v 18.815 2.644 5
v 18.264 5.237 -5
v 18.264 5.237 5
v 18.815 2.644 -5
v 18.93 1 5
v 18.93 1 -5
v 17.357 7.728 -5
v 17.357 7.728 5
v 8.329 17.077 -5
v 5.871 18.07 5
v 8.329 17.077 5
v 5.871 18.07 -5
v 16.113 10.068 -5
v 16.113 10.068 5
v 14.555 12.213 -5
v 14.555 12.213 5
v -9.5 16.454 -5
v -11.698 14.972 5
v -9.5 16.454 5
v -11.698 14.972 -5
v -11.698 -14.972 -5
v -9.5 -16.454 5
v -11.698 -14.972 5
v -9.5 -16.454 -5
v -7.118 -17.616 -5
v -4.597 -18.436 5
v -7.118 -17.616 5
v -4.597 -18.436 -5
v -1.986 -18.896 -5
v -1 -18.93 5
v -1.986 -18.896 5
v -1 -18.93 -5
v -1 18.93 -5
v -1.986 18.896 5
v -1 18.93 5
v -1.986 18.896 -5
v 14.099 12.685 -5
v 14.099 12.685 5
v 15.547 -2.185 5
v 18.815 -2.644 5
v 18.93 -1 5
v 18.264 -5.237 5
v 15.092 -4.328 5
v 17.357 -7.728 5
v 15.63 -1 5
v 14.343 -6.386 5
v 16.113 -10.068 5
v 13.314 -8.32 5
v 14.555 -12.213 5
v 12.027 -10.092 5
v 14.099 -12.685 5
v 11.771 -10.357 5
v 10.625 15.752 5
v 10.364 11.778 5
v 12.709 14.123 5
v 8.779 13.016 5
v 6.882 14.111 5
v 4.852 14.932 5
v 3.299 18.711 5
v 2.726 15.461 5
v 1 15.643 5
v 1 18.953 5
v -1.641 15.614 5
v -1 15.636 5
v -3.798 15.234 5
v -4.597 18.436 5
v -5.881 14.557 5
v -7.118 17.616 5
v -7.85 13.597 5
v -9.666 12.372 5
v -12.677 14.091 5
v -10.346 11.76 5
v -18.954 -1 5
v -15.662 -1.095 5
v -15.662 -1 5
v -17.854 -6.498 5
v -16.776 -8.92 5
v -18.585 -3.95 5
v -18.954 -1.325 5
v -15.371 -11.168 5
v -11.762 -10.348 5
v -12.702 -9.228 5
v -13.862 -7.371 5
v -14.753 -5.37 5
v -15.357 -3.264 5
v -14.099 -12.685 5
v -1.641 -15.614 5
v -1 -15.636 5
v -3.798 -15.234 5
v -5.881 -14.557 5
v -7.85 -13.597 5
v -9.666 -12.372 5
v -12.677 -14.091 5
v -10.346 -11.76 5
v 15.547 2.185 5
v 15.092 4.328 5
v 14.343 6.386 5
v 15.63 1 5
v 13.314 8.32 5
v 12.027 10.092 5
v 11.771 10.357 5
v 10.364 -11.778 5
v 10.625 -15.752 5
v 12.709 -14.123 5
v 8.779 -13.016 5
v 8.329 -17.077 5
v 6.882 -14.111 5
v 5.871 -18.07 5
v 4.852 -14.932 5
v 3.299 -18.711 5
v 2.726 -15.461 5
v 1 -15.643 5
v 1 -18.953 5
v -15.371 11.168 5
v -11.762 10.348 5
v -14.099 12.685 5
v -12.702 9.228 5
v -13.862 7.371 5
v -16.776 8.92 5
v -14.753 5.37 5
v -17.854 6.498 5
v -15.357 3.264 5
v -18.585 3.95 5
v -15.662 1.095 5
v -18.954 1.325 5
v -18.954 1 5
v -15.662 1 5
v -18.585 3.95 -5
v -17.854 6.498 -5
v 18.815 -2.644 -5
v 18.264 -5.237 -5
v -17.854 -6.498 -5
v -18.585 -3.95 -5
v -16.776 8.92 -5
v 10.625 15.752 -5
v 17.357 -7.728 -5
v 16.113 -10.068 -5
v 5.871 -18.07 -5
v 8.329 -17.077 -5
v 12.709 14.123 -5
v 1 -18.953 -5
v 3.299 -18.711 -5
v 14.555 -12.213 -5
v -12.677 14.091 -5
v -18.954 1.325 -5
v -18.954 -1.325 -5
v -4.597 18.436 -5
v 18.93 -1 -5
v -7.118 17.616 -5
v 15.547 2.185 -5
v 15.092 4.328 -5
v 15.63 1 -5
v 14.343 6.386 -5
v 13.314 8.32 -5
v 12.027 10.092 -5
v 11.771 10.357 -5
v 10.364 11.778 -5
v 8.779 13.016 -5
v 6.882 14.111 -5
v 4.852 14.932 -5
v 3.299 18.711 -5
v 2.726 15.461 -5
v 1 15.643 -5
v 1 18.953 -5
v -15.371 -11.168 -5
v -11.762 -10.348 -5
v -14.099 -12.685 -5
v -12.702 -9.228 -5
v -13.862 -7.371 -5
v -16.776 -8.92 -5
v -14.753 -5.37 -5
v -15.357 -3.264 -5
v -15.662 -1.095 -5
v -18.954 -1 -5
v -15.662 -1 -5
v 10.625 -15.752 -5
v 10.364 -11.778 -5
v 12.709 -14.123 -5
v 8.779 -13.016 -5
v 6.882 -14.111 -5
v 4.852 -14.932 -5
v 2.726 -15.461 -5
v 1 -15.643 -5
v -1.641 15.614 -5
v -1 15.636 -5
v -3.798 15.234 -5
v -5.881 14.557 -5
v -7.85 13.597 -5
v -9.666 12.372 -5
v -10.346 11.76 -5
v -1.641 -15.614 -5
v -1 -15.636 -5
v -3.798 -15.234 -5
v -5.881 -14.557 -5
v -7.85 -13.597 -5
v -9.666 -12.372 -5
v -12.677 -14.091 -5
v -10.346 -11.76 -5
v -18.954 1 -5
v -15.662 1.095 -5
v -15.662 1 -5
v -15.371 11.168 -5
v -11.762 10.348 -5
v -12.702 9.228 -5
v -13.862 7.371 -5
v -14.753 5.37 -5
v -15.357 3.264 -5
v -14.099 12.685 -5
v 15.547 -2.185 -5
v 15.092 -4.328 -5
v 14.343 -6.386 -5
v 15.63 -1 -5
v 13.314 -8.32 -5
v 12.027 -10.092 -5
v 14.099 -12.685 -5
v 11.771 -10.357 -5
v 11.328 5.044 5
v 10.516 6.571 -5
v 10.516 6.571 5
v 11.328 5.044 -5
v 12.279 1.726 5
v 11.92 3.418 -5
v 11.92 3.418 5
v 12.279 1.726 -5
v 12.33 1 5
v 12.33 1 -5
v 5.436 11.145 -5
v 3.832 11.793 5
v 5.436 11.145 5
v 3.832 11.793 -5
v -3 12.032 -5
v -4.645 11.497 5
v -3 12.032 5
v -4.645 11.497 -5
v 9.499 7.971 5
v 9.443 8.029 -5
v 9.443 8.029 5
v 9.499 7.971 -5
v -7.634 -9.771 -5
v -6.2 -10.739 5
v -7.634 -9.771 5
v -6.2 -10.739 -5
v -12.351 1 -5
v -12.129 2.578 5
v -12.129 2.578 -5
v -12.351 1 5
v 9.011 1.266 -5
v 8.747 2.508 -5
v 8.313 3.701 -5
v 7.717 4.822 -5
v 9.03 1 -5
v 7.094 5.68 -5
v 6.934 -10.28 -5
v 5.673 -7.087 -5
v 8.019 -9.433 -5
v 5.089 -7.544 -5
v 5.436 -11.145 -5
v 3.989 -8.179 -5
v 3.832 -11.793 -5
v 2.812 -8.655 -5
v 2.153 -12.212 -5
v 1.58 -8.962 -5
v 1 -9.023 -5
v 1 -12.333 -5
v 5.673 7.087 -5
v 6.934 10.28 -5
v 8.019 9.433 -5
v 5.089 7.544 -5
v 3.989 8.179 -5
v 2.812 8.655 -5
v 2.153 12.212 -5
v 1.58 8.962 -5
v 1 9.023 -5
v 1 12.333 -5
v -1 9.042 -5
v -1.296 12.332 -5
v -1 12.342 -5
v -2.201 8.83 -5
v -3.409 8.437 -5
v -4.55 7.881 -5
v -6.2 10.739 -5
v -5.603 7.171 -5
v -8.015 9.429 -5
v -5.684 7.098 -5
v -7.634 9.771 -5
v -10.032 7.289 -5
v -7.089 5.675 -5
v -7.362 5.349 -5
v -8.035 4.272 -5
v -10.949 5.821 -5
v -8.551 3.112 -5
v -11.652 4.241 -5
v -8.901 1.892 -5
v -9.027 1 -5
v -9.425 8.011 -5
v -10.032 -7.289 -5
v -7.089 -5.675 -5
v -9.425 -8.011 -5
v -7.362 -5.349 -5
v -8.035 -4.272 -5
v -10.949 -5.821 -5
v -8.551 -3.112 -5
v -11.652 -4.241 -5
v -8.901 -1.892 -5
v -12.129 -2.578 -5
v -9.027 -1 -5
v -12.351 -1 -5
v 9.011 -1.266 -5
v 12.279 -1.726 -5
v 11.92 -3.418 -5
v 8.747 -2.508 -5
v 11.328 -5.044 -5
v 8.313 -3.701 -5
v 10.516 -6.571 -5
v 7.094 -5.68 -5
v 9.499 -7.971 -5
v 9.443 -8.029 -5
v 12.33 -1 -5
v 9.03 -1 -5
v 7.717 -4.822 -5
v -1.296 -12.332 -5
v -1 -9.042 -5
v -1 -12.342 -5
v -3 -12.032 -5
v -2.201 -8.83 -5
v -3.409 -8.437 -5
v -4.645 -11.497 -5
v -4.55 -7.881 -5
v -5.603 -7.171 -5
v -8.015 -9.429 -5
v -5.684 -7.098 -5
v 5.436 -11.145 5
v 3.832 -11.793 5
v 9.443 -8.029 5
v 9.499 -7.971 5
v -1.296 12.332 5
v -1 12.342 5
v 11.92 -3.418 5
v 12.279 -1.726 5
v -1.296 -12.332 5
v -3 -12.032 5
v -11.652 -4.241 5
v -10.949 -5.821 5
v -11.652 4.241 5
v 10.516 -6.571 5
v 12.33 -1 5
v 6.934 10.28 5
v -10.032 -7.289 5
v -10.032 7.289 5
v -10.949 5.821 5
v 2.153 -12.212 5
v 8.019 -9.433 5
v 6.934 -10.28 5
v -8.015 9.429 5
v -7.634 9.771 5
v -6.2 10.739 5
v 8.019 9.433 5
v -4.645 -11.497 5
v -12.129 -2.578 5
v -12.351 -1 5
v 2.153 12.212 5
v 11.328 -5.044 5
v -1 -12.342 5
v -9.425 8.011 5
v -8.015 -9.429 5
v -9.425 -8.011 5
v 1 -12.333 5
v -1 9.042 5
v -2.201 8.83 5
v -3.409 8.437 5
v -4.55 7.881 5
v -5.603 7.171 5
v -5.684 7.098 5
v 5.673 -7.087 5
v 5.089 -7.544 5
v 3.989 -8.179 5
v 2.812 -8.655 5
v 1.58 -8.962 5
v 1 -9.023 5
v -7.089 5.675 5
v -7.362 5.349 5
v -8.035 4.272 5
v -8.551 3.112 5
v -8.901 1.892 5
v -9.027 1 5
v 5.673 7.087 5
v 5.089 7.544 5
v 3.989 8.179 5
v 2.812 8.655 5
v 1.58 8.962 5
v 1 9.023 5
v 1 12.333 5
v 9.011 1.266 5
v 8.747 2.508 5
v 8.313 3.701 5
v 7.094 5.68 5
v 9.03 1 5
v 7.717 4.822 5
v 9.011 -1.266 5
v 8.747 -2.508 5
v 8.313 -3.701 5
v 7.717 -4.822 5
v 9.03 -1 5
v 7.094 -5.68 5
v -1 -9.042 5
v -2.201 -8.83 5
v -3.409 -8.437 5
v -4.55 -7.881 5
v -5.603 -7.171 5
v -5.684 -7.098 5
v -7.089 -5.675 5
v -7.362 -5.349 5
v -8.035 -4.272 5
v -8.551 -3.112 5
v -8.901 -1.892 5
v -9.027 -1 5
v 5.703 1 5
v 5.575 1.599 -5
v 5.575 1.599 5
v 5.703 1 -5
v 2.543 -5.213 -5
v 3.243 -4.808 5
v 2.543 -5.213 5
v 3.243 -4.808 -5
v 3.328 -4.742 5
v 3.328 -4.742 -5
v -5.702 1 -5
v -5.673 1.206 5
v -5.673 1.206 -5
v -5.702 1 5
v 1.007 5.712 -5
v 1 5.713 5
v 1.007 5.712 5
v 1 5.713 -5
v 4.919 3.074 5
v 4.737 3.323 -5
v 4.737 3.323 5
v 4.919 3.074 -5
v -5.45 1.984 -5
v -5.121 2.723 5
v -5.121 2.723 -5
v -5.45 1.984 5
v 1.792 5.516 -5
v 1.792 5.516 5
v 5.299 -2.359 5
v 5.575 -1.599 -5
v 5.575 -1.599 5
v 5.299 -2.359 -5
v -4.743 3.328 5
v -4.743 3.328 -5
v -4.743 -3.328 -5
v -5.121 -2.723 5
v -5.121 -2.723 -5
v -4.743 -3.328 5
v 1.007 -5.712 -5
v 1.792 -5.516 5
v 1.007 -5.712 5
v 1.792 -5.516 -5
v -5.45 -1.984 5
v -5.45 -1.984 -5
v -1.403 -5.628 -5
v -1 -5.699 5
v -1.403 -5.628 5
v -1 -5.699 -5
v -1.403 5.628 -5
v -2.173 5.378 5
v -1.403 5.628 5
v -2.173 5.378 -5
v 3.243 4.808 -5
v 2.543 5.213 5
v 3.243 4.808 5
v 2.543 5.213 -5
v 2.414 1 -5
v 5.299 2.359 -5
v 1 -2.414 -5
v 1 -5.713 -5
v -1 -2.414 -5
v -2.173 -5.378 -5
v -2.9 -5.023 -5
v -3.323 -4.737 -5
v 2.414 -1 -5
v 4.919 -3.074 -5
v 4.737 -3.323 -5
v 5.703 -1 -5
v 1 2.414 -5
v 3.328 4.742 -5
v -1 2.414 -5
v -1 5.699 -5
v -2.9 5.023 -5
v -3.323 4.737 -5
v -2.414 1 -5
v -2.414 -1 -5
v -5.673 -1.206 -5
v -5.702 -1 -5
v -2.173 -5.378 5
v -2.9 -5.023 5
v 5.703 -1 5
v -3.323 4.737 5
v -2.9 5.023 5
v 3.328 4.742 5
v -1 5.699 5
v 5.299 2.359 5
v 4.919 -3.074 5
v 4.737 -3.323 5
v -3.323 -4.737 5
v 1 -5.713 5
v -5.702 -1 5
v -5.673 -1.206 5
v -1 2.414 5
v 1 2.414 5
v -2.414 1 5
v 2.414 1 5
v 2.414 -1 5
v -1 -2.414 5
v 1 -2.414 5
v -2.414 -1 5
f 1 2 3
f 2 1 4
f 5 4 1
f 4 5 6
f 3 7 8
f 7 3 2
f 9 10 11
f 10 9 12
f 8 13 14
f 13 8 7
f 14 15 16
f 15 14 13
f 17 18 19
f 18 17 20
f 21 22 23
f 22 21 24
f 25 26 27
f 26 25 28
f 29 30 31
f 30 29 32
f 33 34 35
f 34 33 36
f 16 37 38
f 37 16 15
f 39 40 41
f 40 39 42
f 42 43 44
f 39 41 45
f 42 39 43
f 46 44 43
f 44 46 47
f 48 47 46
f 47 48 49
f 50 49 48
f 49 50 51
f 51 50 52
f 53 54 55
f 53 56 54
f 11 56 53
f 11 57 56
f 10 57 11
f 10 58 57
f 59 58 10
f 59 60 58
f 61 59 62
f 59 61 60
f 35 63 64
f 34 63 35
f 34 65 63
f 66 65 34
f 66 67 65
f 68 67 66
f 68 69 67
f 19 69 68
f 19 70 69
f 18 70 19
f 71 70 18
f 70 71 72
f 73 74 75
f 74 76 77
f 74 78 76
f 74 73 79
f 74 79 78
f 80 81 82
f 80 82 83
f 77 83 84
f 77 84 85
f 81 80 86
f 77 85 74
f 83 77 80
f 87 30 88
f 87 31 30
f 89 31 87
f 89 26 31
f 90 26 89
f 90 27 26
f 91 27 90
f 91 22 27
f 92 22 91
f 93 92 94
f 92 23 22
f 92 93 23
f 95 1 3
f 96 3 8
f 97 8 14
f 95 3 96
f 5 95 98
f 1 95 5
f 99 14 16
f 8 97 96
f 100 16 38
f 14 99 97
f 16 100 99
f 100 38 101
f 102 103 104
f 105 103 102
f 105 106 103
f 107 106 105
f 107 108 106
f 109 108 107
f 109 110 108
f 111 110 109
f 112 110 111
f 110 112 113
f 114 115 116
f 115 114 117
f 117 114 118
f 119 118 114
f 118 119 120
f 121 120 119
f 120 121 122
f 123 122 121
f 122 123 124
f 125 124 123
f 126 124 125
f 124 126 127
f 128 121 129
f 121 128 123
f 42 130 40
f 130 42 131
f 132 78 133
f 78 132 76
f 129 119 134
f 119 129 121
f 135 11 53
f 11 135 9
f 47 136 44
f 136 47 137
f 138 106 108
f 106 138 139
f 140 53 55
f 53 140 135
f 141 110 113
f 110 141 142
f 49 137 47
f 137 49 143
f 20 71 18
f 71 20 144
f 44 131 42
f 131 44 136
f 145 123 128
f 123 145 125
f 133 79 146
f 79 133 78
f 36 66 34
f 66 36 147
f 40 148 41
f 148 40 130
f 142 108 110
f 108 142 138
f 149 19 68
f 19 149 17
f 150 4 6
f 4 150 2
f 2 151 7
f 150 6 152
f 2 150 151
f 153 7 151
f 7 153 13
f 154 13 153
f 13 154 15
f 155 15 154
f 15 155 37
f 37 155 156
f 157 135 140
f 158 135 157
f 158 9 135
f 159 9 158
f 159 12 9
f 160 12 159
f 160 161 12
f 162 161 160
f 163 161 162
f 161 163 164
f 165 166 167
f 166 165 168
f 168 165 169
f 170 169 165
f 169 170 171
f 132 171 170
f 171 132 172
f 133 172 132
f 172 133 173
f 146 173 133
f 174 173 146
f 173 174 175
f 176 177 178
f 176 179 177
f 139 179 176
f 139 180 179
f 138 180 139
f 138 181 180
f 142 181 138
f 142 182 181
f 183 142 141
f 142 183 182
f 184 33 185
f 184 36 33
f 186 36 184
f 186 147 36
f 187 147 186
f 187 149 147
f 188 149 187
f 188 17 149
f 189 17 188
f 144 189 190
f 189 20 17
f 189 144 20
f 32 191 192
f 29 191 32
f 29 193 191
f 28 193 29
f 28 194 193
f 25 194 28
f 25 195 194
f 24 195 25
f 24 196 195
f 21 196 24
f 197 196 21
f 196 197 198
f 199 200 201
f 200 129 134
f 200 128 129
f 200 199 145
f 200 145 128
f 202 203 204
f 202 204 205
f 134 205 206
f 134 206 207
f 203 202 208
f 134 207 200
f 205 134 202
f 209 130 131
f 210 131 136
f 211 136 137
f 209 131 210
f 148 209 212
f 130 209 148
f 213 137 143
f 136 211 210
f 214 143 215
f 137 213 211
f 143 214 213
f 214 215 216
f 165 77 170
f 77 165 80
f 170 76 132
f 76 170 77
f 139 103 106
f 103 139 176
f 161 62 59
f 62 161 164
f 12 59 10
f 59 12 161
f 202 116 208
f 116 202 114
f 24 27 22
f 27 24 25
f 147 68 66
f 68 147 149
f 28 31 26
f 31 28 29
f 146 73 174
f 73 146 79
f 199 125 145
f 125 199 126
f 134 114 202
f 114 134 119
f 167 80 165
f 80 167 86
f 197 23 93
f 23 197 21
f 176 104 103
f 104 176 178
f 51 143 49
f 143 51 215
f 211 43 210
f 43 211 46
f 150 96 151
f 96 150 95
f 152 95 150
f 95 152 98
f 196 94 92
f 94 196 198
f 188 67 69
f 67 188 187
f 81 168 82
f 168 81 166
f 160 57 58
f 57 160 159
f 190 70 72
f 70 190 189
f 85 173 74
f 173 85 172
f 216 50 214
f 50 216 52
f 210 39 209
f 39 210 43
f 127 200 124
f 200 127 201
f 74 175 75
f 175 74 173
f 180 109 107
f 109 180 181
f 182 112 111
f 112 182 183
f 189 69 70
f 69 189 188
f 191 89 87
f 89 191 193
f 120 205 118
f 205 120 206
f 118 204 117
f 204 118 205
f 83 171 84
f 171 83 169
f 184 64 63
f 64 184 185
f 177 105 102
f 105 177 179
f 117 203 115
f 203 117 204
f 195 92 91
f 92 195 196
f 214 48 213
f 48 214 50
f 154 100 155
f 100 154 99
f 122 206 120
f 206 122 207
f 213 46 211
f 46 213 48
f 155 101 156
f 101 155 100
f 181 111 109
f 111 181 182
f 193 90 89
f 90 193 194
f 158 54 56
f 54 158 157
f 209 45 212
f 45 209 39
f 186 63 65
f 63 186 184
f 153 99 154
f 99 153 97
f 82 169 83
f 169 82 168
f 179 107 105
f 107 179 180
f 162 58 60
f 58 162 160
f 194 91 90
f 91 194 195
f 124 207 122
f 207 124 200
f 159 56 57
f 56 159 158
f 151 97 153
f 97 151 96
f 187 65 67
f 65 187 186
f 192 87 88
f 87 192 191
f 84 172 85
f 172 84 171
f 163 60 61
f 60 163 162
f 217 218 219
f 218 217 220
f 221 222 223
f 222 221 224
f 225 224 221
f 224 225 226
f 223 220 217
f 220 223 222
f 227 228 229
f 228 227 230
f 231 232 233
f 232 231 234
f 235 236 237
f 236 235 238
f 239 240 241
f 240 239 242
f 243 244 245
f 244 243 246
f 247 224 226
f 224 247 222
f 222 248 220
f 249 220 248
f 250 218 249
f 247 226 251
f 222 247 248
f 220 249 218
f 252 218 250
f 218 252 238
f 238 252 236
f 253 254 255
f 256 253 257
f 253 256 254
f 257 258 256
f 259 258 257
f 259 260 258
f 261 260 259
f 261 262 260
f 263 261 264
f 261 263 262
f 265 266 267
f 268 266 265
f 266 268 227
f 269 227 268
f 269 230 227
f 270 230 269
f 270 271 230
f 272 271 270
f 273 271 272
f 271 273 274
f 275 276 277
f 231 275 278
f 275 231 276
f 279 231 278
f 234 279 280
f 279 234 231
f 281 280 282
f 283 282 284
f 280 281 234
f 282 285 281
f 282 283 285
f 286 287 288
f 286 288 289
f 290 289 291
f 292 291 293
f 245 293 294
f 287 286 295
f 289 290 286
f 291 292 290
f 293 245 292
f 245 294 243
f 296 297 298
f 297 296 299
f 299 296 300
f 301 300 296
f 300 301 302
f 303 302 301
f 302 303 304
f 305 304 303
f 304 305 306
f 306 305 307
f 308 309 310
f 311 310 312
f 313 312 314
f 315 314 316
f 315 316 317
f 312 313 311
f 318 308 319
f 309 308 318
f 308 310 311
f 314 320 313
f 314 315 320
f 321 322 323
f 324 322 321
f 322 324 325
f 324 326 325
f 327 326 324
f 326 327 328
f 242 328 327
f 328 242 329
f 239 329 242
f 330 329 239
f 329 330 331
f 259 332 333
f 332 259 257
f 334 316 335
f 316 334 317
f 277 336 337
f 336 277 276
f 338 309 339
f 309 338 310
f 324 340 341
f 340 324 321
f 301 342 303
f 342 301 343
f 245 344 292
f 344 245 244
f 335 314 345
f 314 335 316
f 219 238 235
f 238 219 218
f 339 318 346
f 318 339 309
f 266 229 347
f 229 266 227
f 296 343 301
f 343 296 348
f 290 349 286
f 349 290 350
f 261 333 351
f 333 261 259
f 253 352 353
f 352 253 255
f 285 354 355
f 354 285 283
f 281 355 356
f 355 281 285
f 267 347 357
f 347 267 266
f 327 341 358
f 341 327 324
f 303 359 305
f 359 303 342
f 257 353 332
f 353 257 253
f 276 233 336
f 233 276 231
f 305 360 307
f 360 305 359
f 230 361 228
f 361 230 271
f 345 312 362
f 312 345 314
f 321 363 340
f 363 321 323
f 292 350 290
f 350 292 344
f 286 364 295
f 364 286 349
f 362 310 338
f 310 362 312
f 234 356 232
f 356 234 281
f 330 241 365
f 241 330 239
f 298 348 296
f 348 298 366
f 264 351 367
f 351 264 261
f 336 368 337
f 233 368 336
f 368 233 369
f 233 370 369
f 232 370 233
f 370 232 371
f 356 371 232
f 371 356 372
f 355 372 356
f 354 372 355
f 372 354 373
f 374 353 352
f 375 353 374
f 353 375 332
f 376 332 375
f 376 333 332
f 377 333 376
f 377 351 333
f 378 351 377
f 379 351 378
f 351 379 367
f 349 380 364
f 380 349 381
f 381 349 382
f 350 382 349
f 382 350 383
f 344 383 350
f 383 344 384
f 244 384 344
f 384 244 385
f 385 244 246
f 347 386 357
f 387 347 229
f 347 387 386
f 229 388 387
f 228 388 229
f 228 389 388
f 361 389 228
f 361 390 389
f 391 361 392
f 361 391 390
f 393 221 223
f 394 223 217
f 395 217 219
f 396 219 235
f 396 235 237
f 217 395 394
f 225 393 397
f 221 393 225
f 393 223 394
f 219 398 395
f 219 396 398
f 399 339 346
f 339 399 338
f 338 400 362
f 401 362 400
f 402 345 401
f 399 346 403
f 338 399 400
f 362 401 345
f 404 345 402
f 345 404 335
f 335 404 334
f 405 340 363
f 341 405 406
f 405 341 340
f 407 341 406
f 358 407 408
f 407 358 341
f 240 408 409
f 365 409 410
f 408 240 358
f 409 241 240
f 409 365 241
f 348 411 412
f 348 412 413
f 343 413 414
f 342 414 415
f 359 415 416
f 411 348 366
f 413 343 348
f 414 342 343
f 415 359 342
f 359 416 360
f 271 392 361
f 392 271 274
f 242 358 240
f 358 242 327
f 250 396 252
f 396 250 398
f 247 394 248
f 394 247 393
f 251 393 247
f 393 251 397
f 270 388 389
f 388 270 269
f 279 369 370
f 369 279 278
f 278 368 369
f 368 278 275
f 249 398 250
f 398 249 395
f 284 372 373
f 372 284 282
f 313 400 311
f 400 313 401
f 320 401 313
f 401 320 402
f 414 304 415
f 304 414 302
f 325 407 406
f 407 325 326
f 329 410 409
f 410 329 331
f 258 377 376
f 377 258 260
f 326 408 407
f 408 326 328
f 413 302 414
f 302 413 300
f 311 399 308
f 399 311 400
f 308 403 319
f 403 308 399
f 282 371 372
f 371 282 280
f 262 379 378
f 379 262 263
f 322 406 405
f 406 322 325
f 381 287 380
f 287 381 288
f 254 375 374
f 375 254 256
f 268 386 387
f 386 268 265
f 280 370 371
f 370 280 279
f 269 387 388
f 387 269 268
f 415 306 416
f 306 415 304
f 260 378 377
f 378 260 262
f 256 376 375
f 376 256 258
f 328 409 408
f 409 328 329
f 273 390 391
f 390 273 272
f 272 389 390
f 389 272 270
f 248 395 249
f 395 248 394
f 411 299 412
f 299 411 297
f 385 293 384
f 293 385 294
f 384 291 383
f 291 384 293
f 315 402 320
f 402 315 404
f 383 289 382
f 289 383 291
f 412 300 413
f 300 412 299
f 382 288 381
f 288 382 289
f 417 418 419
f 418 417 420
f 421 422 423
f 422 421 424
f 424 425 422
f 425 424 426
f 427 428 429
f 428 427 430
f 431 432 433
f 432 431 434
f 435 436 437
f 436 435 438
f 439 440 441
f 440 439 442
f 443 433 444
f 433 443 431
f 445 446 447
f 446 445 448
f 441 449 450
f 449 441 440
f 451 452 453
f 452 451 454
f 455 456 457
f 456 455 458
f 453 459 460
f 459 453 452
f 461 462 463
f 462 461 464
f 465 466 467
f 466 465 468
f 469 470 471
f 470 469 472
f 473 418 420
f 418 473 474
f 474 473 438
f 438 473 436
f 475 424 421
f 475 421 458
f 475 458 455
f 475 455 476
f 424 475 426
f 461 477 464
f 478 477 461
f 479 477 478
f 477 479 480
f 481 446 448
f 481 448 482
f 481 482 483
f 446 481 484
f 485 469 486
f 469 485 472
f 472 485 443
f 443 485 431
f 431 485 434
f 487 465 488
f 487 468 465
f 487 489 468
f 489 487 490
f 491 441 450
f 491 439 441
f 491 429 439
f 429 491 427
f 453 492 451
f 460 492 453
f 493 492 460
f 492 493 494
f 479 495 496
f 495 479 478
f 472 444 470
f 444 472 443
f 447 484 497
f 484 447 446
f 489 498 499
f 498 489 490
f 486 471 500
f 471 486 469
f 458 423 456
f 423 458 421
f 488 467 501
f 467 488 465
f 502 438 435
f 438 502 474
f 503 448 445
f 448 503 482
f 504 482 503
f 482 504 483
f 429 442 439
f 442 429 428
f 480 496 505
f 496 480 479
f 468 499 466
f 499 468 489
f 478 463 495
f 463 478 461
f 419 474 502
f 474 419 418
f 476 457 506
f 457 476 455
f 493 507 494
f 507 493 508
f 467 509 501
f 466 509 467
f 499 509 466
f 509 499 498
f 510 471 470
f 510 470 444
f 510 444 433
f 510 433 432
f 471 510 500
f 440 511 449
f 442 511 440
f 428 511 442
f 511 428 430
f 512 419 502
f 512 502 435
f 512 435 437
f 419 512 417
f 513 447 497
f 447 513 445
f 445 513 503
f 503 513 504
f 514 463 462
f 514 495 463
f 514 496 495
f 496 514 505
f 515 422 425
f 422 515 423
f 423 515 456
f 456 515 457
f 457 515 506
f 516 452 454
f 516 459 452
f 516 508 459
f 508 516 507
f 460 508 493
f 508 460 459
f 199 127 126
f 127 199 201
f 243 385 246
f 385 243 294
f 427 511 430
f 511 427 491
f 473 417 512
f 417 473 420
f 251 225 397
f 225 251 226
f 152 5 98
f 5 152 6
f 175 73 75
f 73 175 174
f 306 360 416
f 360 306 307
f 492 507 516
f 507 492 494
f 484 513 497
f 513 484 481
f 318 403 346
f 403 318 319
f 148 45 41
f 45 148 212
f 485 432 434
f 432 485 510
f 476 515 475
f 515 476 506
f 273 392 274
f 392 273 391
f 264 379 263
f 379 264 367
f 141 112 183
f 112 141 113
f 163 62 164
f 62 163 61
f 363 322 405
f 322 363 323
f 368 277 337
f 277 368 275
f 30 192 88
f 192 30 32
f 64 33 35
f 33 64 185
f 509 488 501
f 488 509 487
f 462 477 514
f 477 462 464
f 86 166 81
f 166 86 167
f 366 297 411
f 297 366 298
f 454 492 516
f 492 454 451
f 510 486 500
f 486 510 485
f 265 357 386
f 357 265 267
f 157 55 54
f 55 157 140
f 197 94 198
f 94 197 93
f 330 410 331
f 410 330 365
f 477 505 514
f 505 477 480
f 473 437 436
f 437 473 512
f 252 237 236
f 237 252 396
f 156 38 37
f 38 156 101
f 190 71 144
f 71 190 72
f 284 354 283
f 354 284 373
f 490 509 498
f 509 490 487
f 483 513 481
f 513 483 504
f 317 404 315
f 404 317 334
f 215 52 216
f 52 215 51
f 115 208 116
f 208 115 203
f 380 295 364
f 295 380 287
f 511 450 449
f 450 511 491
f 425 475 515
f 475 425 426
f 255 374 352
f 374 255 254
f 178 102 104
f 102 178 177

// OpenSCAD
/* [FAN FEATURES] */

// How large is the fan rotor ? (mm)
OuterDiameter=38; 
// How large is the inner part of the fan rotator ? (mm)
InnerDiameter=5; 

/* [RINGS] */

// How many concentric rings should be generated ?
NumberOfRings = 3; // [1:20]
// The height of the extruded rings (mm)
Height = 10; 
// The number of faces on each ring perimeter
Resoultion=45; // [3:100]


/* [CONNECTORS] */

// With of the solid connectors that keeps the rings attached to the surface (mm)
ConnectorsWidth=2;  
// Generate a pair of solid orthogonal connectors ?
AddOrtogonalConnectors="YES"; // [YES,NO]
// Generate a pair of solid diagonal connectors ?
AddDiagonalConnectors="YES"; // [YES,NO]


// VARIABLES INITIALIZATION
echo("OuterDiameter=",OuterDiameter);
echo("InnerDiameter=",InnerDiameter);
echo("NumberOfRings=",NumberOfRings);
echo("Height=",Height);
echo("Resoultion=",Resoultion);

OuterRadius = OuterDiameter/2;
echo("OuterRadius=",OuterRadius);
InnerRadius = InnerDiameter/2;
echo("InnerRadius=",InnerRadius);

DeltaRadius = OuterRadius-InnerRadius;
echo("DeltaRadius=",DeltaRadius);
RingRadiusStep =DeltaRadius/(NumberOfRings*2-1);
echo("RingRadiusStep=",RingRadiusStep);


 
difference()
{
for (i=[0:2:(NumberOfRings*2-1)]){
echo(i," - Outer radius=",OuterRadius-(RingRadiusStep*(i)));
echo(i," - Inner radius=",OuterRadius-(RingRadiusStep*(i+1)));
 difference()
 {  
  cylinder(h=Height,r=OuterRadius-(RingRadiusStep*(i)), center = true, $fn=Resoultion);
  cylinder(h=Height*2,r=OuterRadius-(RingRadiusStep*(i+1)), center = true, $fn=Resoultion);
 } 
}


if(AddOrtogonalConnectors=="YES")
{
cube(size = [OuterDiameter*1.1,ConnectorsWidth,Height*2], center = true);
cube(size = [ConnectorsWidth,OuterDiameter*1.1,Height*2], center = true);
}

if(AddDiagonalConnectors=="YES")
{
rotate([0,0,45])
{
cube(size = [OuterDiameter*1.1,ConnectorsWidth,Height*2], center = true);
cube(size = [ConnectorsWidth,OuterDiameter*1.1,Height*2], center = true);
}
}

}
